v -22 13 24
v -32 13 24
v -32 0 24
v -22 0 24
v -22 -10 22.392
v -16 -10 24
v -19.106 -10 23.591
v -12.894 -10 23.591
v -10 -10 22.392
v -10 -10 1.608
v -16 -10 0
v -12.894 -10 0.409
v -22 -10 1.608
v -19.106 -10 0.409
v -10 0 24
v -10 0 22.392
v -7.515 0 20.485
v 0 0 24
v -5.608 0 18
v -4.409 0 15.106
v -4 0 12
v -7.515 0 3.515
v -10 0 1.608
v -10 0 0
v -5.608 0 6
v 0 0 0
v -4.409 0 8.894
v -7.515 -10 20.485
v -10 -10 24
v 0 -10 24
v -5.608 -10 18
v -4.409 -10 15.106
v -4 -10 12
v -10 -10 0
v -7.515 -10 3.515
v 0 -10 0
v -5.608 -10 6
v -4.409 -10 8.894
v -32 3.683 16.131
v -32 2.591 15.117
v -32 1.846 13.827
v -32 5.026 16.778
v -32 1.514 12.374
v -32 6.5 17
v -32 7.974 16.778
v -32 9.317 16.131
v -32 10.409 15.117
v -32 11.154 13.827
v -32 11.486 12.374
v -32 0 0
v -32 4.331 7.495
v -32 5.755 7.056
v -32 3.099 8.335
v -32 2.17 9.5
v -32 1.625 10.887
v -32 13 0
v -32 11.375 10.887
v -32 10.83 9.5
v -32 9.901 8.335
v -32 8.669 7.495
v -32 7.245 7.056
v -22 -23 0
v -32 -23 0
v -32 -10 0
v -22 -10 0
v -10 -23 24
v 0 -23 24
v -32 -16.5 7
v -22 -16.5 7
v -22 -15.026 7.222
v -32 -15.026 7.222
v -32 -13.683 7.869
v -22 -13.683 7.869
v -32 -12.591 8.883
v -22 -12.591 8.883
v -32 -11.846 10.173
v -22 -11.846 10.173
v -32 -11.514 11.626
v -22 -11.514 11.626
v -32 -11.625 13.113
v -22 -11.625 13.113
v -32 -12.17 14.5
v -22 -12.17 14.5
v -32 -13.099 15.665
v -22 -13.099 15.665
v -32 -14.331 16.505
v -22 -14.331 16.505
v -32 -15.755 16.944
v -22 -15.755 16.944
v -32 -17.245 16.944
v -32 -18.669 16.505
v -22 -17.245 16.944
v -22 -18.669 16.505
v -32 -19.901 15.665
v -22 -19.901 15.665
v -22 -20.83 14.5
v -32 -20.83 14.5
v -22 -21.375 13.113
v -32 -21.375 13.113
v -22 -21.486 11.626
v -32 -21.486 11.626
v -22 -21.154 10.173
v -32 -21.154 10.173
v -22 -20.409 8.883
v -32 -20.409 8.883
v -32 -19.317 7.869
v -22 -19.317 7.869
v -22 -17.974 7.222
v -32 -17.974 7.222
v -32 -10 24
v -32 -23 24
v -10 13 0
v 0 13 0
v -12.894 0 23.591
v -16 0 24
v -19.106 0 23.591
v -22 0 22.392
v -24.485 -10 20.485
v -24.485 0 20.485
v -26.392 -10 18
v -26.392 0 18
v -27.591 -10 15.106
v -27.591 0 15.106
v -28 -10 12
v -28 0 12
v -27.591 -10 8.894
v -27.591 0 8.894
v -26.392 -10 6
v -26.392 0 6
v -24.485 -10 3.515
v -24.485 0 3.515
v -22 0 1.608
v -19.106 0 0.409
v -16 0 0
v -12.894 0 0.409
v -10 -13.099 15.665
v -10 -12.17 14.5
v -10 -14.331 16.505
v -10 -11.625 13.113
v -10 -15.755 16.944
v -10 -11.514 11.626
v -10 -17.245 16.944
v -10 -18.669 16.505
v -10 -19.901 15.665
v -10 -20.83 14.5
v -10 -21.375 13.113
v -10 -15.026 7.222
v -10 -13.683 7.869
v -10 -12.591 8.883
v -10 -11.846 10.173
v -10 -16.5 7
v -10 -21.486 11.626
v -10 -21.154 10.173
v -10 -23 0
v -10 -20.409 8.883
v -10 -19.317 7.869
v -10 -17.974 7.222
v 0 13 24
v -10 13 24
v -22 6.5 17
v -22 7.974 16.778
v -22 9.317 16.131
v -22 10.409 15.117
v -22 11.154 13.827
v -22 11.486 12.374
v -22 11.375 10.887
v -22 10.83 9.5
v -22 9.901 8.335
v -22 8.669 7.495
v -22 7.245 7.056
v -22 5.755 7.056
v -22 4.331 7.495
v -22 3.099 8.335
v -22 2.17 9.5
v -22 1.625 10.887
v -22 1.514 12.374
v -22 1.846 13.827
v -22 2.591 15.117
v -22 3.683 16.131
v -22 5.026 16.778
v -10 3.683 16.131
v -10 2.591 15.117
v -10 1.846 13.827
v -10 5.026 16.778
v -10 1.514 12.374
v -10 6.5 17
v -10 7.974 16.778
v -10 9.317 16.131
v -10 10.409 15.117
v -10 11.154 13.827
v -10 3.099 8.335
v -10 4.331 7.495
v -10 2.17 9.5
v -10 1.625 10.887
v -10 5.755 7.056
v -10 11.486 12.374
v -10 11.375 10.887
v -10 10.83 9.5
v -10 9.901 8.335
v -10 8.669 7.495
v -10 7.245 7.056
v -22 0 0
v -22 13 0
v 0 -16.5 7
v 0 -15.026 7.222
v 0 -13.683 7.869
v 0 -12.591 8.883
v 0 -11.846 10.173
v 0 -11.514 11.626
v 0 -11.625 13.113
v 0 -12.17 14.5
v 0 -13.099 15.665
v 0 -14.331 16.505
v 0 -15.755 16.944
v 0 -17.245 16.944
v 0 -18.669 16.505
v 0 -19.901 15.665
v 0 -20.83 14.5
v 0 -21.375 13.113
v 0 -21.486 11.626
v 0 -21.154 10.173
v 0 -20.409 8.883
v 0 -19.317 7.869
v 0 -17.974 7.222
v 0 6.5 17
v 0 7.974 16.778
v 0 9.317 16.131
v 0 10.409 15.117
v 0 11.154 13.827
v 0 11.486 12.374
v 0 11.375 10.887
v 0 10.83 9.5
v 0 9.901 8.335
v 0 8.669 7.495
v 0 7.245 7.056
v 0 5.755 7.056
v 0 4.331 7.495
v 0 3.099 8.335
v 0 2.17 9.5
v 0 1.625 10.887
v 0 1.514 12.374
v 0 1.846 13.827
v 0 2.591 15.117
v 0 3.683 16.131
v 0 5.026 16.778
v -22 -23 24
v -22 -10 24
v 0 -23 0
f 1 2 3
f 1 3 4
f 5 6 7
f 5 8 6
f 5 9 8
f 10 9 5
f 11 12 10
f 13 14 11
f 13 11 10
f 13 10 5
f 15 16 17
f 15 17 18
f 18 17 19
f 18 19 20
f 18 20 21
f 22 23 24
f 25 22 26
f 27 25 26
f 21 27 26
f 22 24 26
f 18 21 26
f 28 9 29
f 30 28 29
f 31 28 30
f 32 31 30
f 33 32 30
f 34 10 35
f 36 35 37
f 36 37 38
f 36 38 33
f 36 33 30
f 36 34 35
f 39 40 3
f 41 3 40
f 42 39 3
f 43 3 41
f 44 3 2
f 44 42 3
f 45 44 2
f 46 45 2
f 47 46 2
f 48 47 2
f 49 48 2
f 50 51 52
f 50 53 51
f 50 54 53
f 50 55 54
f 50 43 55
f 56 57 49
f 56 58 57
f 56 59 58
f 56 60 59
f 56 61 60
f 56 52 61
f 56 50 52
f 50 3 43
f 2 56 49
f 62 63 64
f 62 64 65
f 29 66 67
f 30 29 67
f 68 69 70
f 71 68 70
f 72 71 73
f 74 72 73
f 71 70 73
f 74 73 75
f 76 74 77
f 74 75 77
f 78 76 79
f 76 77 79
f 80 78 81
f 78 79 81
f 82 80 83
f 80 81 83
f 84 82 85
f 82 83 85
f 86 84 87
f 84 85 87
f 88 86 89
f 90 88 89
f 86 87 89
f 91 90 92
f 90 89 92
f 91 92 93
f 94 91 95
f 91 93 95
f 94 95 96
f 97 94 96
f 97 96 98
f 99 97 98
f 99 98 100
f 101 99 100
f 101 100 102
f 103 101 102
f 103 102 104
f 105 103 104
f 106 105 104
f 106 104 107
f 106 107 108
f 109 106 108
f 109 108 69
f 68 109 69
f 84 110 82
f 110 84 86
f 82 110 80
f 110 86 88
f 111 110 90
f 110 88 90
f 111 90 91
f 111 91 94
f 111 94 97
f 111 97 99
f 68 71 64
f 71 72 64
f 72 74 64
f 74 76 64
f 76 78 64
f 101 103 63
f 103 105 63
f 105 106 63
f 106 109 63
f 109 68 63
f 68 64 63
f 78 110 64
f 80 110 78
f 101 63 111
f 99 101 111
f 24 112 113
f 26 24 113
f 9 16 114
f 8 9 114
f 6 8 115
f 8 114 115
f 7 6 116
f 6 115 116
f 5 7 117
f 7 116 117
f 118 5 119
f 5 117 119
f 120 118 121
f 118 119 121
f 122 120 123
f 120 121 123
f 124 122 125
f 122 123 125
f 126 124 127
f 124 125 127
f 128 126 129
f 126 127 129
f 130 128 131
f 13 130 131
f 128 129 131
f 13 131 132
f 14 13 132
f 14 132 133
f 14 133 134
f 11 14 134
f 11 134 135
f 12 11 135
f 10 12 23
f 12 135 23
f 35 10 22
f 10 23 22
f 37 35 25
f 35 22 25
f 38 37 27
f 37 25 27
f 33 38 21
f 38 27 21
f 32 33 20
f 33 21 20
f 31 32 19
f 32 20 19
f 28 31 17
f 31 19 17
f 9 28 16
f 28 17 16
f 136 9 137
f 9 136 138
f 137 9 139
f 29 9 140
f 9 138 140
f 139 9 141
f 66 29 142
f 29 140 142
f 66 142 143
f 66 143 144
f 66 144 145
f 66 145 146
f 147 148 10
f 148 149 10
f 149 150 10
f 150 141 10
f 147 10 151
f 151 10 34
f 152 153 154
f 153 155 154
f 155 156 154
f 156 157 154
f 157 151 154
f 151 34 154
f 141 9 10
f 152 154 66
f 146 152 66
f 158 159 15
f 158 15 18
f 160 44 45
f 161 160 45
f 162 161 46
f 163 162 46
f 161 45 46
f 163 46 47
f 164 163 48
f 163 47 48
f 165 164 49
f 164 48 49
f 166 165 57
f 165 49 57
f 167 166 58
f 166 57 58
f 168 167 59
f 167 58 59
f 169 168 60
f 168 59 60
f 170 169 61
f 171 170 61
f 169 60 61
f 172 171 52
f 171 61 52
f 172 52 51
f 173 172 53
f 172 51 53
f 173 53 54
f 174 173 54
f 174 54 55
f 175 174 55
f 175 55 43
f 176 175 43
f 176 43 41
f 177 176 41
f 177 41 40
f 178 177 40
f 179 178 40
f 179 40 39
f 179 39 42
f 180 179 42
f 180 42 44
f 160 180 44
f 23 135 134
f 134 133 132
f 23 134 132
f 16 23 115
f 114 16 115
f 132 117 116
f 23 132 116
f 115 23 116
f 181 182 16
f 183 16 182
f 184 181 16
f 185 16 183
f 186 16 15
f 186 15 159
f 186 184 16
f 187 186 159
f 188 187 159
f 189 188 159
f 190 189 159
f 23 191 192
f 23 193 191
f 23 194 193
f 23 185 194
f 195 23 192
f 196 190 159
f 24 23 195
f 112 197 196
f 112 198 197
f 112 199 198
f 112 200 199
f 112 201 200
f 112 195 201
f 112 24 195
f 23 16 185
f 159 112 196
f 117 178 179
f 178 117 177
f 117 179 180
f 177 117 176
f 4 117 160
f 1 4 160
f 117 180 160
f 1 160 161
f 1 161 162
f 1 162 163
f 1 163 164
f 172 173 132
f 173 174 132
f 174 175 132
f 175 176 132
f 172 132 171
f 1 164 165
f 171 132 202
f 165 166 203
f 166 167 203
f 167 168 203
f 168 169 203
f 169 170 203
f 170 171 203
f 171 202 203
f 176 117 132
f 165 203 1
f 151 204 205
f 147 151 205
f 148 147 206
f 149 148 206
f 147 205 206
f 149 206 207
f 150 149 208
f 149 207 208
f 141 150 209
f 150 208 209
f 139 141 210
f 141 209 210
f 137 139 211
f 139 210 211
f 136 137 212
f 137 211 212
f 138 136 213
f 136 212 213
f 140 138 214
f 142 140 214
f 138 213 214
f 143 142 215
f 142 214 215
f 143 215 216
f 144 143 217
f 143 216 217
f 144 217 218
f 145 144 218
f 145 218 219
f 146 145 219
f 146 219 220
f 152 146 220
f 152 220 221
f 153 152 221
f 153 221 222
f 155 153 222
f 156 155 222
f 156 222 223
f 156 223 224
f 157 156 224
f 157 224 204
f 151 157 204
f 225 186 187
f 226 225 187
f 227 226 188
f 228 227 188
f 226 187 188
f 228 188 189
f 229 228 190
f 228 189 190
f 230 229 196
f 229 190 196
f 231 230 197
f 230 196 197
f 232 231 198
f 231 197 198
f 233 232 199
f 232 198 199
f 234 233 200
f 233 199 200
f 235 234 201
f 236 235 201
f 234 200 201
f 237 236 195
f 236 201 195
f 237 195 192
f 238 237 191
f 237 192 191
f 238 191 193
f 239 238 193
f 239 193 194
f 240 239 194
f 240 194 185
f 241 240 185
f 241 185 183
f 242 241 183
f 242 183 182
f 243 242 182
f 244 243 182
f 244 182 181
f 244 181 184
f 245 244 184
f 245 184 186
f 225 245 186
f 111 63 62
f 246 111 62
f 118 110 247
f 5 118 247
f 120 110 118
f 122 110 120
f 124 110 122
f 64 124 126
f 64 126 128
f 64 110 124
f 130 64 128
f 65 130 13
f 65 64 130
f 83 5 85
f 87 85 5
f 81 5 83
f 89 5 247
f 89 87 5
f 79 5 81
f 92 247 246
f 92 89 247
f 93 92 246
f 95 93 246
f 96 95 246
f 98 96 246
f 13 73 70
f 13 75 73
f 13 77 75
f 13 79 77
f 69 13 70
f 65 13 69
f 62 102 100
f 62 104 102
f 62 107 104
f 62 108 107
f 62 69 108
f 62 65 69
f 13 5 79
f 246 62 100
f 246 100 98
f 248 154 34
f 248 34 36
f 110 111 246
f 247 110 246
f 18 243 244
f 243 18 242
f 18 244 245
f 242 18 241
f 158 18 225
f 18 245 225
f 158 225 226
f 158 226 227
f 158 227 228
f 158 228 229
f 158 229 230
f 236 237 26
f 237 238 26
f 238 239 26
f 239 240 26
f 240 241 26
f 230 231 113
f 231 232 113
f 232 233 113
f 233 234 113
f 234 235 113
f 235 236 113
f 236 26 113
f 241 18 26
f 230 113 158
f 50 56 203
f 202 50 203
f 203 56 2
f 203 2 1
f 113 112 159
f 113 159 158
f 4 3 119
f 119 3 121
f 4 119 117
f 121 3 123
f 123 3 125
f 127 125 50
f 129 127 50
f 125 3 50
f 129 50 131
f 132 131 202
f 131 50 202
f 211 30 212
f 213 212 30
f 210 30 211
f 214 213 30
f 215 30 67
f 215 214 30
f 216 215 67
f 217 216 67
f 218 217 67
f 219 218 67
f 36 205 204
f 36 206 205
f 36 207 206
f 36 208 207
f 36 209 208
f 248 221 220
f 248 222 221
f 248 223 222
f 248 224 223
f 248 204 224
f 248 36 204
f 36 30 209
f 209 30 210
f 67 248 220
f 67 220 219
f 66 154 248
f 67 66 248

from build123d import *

# Parameters (mm, degrees)
SKETCH1_W           = 32
SKETCH1_H           = 13
BOSS_EXTRUDE1_DEPTH = 24
SKETCH2_W           = 12
SKETCH2_H           = 13
CUT_EXTRUDE1_DEPTH  = 43.05948169
SKETCH3_R           = 4.5
CUT_EXTRUDE2_DEPTH  = 43.05948169
SKETCH4_R           = 12
BOSS_EXTRUDE2_DEPTH = 10
SKETCH5_R           = 5
CUT_EXTRUDE3_DEPTH  = 47.14108798
SKETCH6_R           = 5
CUT_EXTRUDE4_DEPTH  = 47.14108798


with BuildPart() as part:
    # Sketch1 → Boss-Extrude1 (new body)
    with BuildSketch(Plane.XY):
        with Locations((-16, 6.5)):
            Rectangle(SKETCH1_W, SKETCH1_H)
    boss_extrude1 = extrude(amount=BOSS_EXTRUDE1_DEPTH)

    # Sketch2 → Cut-Extrude1 (cut, through all)
    with BuildSketch(Plane(origin=(0, 0, 0), x_dir=(-1, 0, 0), z_dir=(0, 0, -1))):
        with Locations((16, 6.5)):
            Rectangle(SKETCH2_W, SKETCH2_H)
    cut_extrude1 = extrude(amount=-CUT_EXTRUDE1_DEPTH, mode=Mode.SUBTRACT)


with BuildPart() as cut_extrude1_piece_1:
    # of the separate pieces the step leaves, piece 1, a body of its own (cut_extrude1_pieces)
    add(part.part.solids().sort_by_distance((0, 0, 0))[0])


with BuildPart() as cut_extrude1_piece_2:
    # of the separate pieces the step leaves, piece 2, a body of its own (cut_extrude1_pieces)
    add(part.part.solids().sort_by_distance((-32, 0, 0))[0])


with BuildPart() as cut_extrude2_tool:
    # Sketch3 → Cut-Extrude2 (new, through all)
    with BuildSketch(Plane(origin=(0, 0, 0), x_dir=(0, 0, -1), z_dir=(1, 0, 0))):
        with Locations((-12, 6.5)):
            Circle(SKETCH3_R)
    cut_extrude2 = extrude(amount=-CUT_EXTRUDE2_DEPTH)


with BuildPart() as cut_extrude1_piece_1_1:
    add(cut_extrude1_piece_1.part)

    # Cut-Extrude2: cut by cut_extrude2_tool
    add(cut_extrude2_tool.part, mode=Mode.SUBTRACT)



with BuildPart() as cut_extrude1_piece_2_1:
    add(cut_extrude1_piece_2.part)

    # Cut-Extrude2: cut by cut_extrude2_tool
    add(cut_extrude2_tool.part, mode=Mode.SUBTRACT)


with BuildPart() as cut_extrude1_piece_1_2:
    add(cut_extrude1_piece_1_1.part)

    add(cut_extrude1_piece_2_1.part)  # Boss-Extrude2 merges Cut-Extrude1 piece 2
    # Sketch4 → Boss-Extrude2 (add)
    with BuildSketch(Plane(origin=(0, 0, 0), x_dir=(-1, 0, 0), z_dir=(0, -1, 0))):
        with Locations(Location((16, -12, 0), (0, 0, 240))):
            Circle(SKETCH4_R)
    extrude(amount=BOSS_EXTRUDE2_DEPTH)

    # Mirror1: Boss-Extrude1, Cut-Extrude1, Cut-Extrude2 across plane
    add(boss_extrude1.mirror(Plane.ZX.offset(-5)))
    add(cut_extrude1.mirror(Plane.ZX.offset(-5)), mode=Mode.SUBTRACT)
    add(cut_extrude2.mirror(Plane.ZX.offset(-5)), mode=Mode.SUBTRACT)

    # Sketch5 → Cut-Extrude3 (cut, through all)
    with BuildSketch(Plane(origin=(0, 0, 0), x_dir=(0, 0, -1), z_dir=(1, 0, 0))):
        with Locations((-12, -16.5)):
            Circle(SKETCH5_R)
    extrude(amount=-CUT_EXTRUDE3_DEPTH, mode=Mode.SUBTRACT)

    # Sketch6 → Cut-Extrude4 (cut, through all)
    with BuildSketch(Plane.ZY.offset(32)):
        with Locations((12, 6.5)):
            Circle(SKETCH6_R)
    extrude(amount=-CUT_EXTRUDE4_DEPTH, mode=Mode.SUBTRACT)


solid = cut_extrude1_piece_1_2.part
